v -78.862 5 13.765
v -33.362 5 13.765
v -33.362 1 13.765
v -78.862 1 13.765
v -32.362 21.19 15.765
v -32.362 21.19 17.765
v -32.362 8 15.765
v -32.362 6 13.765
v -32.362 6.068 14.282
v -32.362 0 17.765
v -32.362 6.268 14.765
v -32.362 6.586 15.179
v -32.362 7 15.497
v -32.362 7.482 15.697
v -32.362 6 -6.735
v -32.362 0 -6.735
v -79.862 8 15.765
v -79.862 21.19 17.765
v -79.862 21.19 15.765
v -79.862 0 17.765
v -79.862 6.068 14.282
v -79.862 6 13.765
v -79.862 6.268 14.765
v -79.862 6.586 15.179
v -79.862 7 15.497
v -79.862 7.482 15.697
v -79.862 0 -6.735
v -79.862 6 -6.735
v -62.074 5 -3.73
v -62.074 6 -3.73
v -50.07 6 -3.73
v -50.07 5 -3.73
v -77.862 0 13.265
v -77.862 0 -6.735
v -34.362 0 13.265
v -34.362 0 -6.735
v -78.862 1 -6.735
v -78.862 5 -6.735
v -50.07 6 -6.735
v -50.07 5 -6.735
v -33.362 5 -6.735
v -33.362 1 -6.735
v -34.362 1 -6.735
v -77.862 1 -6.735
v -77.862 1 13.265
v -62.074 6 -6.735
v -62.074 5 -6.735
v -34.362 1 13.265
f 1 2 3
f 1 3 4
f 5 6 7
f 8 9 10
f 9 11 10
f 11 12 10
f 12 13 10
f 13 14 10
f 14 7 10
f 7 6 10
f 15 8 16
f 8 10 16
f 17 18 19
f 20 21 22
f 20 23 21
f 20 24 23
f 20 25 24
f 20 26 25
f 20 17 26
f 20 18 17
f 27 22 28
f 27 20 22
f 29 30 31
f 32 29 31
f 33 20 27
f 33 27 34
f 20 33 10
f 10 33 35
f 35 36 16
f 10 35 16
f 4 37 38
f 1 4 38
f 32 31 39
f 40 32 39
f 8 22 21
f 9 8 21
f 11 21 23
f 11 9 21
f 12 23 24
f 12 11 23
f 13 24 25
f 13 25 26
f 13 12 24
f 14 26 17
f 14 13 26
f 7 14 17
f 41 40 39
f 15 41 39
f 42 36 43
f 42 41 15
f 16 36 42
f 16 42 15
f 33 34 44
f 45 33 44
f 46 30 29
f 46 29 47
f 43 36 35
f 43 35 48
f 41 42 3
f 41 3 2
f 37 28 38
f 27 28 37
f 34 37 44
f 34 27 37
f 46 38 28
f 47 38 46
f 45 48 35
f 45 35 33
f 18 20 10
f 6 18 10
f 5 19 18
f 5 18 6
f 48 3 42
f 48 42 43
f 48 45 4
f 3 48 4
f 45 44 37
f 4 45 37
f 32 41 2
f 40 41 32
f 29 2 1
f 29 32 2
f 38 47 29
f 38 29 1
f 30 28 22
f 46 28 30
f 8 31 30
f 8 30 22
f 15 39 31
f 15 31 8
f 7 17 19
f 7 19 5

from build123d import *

# Parameters (mm, degrees)
SKETCH3_W           = 47.5
SKETCH3_H           = 22.5
BOSS_EXTRUDE1_DEPTH = 6
SKETCH74_W          = 12.004185621
SKETCH74_H          = 3.004883548
CUT_EXTRUDE6_DEPTH  = 10
SKETCH79_W          = 47.5
SKETCH79_H          = 2
BOSS_EXTRUDE2_DEPTH = 21.190075336
FILLET6_R           = 2
SKETCH82_W          = 45.5
SKETCH82_H          = 4
CUT_EXTRUDE7_DEPTH  = 20.5
SKETCH84_W          = 43.5
SKETCH84_H          = 1
CUT_EXTRUDE8_DEPTH  = 20


with BuildPart() as part:
    # Sketch3 → Boss-Extrude1 (new body)
    with BuildSketch(Plane(origin=(0, 0, 0), x_dir=(1, 0, 0), z_dir=(0, 1, 0))):
        with Locations((-56.111912524, -4.514800621)):
            Rectangle(SKETCH3_W, SKETCH3_H)
    extrude(amount=BOSS_EXTRUDE1_DEPTH)

    # Sketch74 → Cut-Extrude6 (cut)
    with BuildSketch(Plane(origin=(0, 6, 0), x_dir=(1, 0, 0), z_dir=(0, 1, 0))):
        with Locations((-56.07183951, 5.232757605)):
            Rectangle(SKETCH74_W, SKETCH74_H)
    extrude(amount=-CUT_EXTRUDE6_DEPTH, mode=Mode.SUBTRACT)

    # Sketch79 → Boss-Extrude2 (add)
    with BuildSketch(Plane(origin=(0, 0, 0), x_dir=(1, 0, 0), z_dir=(0, 1, 0))):
        with Locations((-56.111912524, -16.764800621)):
            Rectangle(SKETCH79_W, SKETCH79_H)
    extrude(amount=BOSS_EXTRUDE2_DEPTH)

    # Fillet6
    fillet6_edges = [part.edges().sort_by_distance(p)[0] for p in [
        (-56.111912524, 6, 15.764800621),
    ]]
    fillet(fillet6_edges, radius=FILLET6_R)

    # Sketch82 → Cut-Extrude7 (cut)
    with BuildSketch(Plane(origin=(0, 0, -6.735199379), x_dir=(-1, 0, 0), z_dir=(0, 0, -1))):
        with Locations((56.111912524, 3)):
            Rectangle(SKETCH82_W, SKETCH82_H)
    extrude(amount=-CUT_EXTRUDE7_DEPTH, mode=Mode.SUBTRACT)

    # Sketch84 → Cut-Extrude8 (cut)
    with BuildSketch(Plane(origin=(0, 0, -6.735199379), x_dir=(-1, 0, 0), z_dir=(0, 0, -1))):
        with Locations((56.111912524, 0.5)):
            Rectangle(SKETCH84_W, SKETCH84_H)
    extrude(amount=-CUT_EXTRUDE8_DEPTH, mode=Mode.SUBTRACT)


solid = part.part
